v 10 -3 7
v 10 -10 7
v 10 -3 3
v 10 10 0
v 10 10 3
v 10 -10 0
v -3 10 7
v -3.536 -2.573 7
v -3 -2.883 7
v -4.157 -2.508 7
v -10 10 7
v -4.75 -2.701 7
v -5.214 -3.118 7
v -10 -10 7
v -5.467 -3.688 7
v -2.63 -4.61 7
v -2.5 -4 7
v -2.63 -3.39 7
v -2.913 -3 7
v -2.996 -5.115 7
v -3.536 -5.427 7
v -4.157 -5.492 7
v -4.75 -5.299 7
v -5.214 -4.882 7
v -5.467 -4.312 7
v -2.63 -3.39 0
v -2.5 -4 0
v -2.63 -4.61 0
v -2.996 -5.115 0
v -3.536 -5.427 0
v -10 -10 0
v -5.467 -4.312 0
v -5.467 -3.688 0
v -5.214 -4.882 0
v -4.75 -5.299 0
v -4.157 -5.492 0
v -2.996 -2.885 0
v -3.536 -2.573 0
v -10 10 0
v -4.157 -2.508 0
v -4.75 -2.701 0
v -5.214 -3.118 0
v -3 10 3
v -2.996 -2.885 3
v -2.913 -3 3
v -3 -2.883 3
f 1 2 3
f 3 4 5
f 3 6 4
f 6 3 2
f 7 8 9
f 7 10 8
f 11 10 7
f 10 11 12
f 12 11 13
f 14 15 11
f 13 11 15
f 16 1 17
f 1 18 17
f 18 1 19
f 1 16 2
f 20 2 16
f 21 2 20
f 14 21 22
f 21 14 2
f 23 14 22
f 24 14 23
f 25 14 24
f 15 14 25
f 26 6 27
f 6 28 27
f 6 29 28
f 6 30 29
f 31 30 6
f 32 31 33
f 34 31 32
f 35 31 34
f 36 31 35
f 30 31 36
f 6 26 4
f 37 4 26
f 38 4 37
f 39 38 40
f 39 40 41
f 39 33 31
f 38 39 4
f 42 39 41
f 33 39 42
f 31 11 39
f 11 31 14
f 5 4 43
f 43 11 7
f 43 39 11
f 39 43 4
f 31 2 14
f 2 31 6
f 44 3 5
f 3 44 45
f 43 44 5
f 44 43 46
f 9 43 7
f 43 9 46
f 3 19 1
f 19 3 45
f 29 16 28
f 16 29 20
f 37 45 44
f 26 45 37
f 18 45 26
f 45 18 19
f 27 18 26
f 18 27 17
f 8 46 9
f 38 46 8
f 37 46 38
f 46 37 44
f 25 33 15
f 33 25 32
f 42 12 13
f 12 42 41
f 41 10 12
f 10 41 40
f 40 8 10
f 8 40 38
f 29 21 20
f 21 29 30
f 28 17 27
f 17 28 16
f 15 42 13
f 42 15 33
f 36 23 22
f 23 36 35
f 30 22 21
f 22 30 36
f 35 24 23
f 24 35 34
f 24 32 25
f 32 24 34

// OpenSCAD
difference() {
 translate([-10,-10, 0]) cube(size=[20, 20, 7]);
 translate([-3, -3,  3]) cube(size=[20, 20, 5]);
 translate([-4, -4, -2]) cylinder(h=10, r=1.5, center=false, $fn=15);
}
